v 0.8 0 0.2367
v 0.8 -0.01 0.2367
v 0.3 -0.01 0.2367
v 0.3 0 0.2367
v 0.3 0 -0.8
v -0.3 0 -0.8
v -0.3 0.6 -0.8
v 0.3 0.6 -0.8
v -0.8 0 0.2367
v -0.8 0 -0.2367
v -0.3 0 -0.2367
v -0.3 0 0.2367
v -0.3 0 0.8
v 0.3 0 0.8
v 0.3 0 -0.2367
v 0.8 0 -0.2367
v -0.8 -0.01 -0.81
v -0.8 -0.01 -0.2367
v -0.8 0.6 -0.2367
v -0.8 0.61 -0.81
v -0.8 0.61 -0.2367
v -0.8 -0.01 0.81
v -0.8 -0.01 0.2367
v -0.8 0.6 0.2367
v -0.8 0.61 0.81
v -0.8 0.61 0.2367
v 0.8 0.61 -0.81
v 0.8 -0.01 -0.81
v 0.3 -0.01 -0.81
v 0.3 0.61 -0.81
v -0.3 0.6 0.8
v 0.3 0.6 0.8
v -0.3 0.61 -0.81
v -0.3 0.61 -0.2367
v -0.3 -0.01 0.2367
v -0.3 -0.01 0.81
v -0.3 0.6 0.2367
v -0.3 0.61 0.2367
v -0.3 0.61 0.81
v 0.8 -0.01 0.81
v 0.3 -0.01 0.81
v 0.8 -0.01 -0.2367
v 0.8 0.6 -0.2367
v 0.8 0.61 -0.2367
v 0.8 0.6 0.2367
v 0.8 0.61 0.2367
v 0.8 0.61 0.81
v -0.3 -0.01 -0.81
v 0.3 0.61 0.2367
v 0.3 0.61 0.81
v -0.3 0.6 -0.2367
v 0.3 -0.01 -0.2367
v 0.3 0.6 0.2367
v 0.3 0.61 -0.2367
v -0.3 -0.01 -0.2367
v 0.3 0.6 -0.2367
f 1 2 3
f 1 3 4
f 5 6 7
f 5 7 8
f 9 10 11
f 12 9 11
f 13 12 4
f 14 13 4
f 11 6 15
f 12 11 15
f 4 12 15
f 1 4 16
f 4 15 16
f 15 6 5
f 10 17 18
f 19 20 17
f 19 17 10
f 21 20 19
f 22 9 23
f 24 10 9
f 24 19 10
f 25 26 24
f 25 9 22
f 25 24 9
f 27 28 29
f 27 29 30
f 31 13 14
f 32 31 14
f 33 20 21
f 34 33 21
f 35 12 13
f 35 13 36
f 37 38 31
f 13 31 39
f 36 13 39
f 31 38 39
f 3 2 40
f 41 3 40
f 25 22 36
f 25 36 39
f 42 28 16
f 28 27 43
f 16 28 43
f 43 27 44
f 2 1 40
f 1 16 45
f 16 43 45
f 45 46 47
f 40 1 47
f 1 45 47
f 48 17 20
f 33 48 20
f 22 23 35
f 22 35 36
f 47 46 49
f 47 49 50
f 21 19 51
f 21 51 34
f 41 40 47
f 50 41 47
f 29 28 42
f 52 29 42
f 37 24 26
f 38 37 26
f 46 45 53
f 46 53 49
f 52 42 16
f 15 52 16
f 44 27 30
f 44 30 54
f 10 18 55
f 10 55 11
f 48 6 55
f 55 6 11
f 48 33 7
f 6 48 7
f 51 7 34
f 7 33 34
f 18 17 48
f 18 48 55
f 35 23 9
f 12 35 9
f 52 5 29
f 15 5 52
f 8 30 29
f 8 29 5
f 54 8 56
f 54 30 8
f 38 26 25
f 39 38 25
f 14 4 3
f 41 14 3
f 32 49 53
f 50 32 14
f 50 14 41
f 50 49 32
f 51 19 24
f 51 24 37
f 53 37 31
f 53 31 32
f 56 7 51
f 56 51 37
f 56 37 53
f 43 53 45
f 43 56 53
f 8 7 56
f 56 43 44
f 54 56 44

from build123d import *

# Parameters (mm, degrees)
SKETCH_1_W      = 1.6
SKETCH_1_H      = 1.6
EXTRUDE_1_DEPTH = 0.6
SKETCH_2_W      = 0.573263013
SKETCH_2_H      = 0.62
EXTRUDE_2_DEPTH = 0.5


with BuildPart() as part:
    # 草图1 → 凸台-拉伸1 (new body)
    with BuildSketch(Plane(origin=(0, 0, 0), x_dir=(1, 0, 0), z_dir=(0, 1, 0))):
        Rectangle(SKETCH_1_W, SKETCH_1_H)
    extrude(amount=EXTRUDE_1_DEPTH)

    # 草图2 → 凸台-拉伸2 (add)
    with BuildSketch(Plane.ZY.offset(0.8)):
        with Locations((0.523368494, 0.3)):
            Rectangle(SKETCH_2_W, SKETCH_2_H)
        with Locations((-0.523368494, 0.3)):
            Rectangle(SKETCH_2_W, SKETCH_2_H)
    extrude_2 = extrude(amount=-EXTRUDE_2_DEPTH)

    # 镜向1: 凸台-拉伸2 across plane
    add(extrude_2.mirror(Plane(origin=(0, 0, 0), x_dir=(0, 0, 1), z_dir=(1, 0, 0))))


solid = part.part
